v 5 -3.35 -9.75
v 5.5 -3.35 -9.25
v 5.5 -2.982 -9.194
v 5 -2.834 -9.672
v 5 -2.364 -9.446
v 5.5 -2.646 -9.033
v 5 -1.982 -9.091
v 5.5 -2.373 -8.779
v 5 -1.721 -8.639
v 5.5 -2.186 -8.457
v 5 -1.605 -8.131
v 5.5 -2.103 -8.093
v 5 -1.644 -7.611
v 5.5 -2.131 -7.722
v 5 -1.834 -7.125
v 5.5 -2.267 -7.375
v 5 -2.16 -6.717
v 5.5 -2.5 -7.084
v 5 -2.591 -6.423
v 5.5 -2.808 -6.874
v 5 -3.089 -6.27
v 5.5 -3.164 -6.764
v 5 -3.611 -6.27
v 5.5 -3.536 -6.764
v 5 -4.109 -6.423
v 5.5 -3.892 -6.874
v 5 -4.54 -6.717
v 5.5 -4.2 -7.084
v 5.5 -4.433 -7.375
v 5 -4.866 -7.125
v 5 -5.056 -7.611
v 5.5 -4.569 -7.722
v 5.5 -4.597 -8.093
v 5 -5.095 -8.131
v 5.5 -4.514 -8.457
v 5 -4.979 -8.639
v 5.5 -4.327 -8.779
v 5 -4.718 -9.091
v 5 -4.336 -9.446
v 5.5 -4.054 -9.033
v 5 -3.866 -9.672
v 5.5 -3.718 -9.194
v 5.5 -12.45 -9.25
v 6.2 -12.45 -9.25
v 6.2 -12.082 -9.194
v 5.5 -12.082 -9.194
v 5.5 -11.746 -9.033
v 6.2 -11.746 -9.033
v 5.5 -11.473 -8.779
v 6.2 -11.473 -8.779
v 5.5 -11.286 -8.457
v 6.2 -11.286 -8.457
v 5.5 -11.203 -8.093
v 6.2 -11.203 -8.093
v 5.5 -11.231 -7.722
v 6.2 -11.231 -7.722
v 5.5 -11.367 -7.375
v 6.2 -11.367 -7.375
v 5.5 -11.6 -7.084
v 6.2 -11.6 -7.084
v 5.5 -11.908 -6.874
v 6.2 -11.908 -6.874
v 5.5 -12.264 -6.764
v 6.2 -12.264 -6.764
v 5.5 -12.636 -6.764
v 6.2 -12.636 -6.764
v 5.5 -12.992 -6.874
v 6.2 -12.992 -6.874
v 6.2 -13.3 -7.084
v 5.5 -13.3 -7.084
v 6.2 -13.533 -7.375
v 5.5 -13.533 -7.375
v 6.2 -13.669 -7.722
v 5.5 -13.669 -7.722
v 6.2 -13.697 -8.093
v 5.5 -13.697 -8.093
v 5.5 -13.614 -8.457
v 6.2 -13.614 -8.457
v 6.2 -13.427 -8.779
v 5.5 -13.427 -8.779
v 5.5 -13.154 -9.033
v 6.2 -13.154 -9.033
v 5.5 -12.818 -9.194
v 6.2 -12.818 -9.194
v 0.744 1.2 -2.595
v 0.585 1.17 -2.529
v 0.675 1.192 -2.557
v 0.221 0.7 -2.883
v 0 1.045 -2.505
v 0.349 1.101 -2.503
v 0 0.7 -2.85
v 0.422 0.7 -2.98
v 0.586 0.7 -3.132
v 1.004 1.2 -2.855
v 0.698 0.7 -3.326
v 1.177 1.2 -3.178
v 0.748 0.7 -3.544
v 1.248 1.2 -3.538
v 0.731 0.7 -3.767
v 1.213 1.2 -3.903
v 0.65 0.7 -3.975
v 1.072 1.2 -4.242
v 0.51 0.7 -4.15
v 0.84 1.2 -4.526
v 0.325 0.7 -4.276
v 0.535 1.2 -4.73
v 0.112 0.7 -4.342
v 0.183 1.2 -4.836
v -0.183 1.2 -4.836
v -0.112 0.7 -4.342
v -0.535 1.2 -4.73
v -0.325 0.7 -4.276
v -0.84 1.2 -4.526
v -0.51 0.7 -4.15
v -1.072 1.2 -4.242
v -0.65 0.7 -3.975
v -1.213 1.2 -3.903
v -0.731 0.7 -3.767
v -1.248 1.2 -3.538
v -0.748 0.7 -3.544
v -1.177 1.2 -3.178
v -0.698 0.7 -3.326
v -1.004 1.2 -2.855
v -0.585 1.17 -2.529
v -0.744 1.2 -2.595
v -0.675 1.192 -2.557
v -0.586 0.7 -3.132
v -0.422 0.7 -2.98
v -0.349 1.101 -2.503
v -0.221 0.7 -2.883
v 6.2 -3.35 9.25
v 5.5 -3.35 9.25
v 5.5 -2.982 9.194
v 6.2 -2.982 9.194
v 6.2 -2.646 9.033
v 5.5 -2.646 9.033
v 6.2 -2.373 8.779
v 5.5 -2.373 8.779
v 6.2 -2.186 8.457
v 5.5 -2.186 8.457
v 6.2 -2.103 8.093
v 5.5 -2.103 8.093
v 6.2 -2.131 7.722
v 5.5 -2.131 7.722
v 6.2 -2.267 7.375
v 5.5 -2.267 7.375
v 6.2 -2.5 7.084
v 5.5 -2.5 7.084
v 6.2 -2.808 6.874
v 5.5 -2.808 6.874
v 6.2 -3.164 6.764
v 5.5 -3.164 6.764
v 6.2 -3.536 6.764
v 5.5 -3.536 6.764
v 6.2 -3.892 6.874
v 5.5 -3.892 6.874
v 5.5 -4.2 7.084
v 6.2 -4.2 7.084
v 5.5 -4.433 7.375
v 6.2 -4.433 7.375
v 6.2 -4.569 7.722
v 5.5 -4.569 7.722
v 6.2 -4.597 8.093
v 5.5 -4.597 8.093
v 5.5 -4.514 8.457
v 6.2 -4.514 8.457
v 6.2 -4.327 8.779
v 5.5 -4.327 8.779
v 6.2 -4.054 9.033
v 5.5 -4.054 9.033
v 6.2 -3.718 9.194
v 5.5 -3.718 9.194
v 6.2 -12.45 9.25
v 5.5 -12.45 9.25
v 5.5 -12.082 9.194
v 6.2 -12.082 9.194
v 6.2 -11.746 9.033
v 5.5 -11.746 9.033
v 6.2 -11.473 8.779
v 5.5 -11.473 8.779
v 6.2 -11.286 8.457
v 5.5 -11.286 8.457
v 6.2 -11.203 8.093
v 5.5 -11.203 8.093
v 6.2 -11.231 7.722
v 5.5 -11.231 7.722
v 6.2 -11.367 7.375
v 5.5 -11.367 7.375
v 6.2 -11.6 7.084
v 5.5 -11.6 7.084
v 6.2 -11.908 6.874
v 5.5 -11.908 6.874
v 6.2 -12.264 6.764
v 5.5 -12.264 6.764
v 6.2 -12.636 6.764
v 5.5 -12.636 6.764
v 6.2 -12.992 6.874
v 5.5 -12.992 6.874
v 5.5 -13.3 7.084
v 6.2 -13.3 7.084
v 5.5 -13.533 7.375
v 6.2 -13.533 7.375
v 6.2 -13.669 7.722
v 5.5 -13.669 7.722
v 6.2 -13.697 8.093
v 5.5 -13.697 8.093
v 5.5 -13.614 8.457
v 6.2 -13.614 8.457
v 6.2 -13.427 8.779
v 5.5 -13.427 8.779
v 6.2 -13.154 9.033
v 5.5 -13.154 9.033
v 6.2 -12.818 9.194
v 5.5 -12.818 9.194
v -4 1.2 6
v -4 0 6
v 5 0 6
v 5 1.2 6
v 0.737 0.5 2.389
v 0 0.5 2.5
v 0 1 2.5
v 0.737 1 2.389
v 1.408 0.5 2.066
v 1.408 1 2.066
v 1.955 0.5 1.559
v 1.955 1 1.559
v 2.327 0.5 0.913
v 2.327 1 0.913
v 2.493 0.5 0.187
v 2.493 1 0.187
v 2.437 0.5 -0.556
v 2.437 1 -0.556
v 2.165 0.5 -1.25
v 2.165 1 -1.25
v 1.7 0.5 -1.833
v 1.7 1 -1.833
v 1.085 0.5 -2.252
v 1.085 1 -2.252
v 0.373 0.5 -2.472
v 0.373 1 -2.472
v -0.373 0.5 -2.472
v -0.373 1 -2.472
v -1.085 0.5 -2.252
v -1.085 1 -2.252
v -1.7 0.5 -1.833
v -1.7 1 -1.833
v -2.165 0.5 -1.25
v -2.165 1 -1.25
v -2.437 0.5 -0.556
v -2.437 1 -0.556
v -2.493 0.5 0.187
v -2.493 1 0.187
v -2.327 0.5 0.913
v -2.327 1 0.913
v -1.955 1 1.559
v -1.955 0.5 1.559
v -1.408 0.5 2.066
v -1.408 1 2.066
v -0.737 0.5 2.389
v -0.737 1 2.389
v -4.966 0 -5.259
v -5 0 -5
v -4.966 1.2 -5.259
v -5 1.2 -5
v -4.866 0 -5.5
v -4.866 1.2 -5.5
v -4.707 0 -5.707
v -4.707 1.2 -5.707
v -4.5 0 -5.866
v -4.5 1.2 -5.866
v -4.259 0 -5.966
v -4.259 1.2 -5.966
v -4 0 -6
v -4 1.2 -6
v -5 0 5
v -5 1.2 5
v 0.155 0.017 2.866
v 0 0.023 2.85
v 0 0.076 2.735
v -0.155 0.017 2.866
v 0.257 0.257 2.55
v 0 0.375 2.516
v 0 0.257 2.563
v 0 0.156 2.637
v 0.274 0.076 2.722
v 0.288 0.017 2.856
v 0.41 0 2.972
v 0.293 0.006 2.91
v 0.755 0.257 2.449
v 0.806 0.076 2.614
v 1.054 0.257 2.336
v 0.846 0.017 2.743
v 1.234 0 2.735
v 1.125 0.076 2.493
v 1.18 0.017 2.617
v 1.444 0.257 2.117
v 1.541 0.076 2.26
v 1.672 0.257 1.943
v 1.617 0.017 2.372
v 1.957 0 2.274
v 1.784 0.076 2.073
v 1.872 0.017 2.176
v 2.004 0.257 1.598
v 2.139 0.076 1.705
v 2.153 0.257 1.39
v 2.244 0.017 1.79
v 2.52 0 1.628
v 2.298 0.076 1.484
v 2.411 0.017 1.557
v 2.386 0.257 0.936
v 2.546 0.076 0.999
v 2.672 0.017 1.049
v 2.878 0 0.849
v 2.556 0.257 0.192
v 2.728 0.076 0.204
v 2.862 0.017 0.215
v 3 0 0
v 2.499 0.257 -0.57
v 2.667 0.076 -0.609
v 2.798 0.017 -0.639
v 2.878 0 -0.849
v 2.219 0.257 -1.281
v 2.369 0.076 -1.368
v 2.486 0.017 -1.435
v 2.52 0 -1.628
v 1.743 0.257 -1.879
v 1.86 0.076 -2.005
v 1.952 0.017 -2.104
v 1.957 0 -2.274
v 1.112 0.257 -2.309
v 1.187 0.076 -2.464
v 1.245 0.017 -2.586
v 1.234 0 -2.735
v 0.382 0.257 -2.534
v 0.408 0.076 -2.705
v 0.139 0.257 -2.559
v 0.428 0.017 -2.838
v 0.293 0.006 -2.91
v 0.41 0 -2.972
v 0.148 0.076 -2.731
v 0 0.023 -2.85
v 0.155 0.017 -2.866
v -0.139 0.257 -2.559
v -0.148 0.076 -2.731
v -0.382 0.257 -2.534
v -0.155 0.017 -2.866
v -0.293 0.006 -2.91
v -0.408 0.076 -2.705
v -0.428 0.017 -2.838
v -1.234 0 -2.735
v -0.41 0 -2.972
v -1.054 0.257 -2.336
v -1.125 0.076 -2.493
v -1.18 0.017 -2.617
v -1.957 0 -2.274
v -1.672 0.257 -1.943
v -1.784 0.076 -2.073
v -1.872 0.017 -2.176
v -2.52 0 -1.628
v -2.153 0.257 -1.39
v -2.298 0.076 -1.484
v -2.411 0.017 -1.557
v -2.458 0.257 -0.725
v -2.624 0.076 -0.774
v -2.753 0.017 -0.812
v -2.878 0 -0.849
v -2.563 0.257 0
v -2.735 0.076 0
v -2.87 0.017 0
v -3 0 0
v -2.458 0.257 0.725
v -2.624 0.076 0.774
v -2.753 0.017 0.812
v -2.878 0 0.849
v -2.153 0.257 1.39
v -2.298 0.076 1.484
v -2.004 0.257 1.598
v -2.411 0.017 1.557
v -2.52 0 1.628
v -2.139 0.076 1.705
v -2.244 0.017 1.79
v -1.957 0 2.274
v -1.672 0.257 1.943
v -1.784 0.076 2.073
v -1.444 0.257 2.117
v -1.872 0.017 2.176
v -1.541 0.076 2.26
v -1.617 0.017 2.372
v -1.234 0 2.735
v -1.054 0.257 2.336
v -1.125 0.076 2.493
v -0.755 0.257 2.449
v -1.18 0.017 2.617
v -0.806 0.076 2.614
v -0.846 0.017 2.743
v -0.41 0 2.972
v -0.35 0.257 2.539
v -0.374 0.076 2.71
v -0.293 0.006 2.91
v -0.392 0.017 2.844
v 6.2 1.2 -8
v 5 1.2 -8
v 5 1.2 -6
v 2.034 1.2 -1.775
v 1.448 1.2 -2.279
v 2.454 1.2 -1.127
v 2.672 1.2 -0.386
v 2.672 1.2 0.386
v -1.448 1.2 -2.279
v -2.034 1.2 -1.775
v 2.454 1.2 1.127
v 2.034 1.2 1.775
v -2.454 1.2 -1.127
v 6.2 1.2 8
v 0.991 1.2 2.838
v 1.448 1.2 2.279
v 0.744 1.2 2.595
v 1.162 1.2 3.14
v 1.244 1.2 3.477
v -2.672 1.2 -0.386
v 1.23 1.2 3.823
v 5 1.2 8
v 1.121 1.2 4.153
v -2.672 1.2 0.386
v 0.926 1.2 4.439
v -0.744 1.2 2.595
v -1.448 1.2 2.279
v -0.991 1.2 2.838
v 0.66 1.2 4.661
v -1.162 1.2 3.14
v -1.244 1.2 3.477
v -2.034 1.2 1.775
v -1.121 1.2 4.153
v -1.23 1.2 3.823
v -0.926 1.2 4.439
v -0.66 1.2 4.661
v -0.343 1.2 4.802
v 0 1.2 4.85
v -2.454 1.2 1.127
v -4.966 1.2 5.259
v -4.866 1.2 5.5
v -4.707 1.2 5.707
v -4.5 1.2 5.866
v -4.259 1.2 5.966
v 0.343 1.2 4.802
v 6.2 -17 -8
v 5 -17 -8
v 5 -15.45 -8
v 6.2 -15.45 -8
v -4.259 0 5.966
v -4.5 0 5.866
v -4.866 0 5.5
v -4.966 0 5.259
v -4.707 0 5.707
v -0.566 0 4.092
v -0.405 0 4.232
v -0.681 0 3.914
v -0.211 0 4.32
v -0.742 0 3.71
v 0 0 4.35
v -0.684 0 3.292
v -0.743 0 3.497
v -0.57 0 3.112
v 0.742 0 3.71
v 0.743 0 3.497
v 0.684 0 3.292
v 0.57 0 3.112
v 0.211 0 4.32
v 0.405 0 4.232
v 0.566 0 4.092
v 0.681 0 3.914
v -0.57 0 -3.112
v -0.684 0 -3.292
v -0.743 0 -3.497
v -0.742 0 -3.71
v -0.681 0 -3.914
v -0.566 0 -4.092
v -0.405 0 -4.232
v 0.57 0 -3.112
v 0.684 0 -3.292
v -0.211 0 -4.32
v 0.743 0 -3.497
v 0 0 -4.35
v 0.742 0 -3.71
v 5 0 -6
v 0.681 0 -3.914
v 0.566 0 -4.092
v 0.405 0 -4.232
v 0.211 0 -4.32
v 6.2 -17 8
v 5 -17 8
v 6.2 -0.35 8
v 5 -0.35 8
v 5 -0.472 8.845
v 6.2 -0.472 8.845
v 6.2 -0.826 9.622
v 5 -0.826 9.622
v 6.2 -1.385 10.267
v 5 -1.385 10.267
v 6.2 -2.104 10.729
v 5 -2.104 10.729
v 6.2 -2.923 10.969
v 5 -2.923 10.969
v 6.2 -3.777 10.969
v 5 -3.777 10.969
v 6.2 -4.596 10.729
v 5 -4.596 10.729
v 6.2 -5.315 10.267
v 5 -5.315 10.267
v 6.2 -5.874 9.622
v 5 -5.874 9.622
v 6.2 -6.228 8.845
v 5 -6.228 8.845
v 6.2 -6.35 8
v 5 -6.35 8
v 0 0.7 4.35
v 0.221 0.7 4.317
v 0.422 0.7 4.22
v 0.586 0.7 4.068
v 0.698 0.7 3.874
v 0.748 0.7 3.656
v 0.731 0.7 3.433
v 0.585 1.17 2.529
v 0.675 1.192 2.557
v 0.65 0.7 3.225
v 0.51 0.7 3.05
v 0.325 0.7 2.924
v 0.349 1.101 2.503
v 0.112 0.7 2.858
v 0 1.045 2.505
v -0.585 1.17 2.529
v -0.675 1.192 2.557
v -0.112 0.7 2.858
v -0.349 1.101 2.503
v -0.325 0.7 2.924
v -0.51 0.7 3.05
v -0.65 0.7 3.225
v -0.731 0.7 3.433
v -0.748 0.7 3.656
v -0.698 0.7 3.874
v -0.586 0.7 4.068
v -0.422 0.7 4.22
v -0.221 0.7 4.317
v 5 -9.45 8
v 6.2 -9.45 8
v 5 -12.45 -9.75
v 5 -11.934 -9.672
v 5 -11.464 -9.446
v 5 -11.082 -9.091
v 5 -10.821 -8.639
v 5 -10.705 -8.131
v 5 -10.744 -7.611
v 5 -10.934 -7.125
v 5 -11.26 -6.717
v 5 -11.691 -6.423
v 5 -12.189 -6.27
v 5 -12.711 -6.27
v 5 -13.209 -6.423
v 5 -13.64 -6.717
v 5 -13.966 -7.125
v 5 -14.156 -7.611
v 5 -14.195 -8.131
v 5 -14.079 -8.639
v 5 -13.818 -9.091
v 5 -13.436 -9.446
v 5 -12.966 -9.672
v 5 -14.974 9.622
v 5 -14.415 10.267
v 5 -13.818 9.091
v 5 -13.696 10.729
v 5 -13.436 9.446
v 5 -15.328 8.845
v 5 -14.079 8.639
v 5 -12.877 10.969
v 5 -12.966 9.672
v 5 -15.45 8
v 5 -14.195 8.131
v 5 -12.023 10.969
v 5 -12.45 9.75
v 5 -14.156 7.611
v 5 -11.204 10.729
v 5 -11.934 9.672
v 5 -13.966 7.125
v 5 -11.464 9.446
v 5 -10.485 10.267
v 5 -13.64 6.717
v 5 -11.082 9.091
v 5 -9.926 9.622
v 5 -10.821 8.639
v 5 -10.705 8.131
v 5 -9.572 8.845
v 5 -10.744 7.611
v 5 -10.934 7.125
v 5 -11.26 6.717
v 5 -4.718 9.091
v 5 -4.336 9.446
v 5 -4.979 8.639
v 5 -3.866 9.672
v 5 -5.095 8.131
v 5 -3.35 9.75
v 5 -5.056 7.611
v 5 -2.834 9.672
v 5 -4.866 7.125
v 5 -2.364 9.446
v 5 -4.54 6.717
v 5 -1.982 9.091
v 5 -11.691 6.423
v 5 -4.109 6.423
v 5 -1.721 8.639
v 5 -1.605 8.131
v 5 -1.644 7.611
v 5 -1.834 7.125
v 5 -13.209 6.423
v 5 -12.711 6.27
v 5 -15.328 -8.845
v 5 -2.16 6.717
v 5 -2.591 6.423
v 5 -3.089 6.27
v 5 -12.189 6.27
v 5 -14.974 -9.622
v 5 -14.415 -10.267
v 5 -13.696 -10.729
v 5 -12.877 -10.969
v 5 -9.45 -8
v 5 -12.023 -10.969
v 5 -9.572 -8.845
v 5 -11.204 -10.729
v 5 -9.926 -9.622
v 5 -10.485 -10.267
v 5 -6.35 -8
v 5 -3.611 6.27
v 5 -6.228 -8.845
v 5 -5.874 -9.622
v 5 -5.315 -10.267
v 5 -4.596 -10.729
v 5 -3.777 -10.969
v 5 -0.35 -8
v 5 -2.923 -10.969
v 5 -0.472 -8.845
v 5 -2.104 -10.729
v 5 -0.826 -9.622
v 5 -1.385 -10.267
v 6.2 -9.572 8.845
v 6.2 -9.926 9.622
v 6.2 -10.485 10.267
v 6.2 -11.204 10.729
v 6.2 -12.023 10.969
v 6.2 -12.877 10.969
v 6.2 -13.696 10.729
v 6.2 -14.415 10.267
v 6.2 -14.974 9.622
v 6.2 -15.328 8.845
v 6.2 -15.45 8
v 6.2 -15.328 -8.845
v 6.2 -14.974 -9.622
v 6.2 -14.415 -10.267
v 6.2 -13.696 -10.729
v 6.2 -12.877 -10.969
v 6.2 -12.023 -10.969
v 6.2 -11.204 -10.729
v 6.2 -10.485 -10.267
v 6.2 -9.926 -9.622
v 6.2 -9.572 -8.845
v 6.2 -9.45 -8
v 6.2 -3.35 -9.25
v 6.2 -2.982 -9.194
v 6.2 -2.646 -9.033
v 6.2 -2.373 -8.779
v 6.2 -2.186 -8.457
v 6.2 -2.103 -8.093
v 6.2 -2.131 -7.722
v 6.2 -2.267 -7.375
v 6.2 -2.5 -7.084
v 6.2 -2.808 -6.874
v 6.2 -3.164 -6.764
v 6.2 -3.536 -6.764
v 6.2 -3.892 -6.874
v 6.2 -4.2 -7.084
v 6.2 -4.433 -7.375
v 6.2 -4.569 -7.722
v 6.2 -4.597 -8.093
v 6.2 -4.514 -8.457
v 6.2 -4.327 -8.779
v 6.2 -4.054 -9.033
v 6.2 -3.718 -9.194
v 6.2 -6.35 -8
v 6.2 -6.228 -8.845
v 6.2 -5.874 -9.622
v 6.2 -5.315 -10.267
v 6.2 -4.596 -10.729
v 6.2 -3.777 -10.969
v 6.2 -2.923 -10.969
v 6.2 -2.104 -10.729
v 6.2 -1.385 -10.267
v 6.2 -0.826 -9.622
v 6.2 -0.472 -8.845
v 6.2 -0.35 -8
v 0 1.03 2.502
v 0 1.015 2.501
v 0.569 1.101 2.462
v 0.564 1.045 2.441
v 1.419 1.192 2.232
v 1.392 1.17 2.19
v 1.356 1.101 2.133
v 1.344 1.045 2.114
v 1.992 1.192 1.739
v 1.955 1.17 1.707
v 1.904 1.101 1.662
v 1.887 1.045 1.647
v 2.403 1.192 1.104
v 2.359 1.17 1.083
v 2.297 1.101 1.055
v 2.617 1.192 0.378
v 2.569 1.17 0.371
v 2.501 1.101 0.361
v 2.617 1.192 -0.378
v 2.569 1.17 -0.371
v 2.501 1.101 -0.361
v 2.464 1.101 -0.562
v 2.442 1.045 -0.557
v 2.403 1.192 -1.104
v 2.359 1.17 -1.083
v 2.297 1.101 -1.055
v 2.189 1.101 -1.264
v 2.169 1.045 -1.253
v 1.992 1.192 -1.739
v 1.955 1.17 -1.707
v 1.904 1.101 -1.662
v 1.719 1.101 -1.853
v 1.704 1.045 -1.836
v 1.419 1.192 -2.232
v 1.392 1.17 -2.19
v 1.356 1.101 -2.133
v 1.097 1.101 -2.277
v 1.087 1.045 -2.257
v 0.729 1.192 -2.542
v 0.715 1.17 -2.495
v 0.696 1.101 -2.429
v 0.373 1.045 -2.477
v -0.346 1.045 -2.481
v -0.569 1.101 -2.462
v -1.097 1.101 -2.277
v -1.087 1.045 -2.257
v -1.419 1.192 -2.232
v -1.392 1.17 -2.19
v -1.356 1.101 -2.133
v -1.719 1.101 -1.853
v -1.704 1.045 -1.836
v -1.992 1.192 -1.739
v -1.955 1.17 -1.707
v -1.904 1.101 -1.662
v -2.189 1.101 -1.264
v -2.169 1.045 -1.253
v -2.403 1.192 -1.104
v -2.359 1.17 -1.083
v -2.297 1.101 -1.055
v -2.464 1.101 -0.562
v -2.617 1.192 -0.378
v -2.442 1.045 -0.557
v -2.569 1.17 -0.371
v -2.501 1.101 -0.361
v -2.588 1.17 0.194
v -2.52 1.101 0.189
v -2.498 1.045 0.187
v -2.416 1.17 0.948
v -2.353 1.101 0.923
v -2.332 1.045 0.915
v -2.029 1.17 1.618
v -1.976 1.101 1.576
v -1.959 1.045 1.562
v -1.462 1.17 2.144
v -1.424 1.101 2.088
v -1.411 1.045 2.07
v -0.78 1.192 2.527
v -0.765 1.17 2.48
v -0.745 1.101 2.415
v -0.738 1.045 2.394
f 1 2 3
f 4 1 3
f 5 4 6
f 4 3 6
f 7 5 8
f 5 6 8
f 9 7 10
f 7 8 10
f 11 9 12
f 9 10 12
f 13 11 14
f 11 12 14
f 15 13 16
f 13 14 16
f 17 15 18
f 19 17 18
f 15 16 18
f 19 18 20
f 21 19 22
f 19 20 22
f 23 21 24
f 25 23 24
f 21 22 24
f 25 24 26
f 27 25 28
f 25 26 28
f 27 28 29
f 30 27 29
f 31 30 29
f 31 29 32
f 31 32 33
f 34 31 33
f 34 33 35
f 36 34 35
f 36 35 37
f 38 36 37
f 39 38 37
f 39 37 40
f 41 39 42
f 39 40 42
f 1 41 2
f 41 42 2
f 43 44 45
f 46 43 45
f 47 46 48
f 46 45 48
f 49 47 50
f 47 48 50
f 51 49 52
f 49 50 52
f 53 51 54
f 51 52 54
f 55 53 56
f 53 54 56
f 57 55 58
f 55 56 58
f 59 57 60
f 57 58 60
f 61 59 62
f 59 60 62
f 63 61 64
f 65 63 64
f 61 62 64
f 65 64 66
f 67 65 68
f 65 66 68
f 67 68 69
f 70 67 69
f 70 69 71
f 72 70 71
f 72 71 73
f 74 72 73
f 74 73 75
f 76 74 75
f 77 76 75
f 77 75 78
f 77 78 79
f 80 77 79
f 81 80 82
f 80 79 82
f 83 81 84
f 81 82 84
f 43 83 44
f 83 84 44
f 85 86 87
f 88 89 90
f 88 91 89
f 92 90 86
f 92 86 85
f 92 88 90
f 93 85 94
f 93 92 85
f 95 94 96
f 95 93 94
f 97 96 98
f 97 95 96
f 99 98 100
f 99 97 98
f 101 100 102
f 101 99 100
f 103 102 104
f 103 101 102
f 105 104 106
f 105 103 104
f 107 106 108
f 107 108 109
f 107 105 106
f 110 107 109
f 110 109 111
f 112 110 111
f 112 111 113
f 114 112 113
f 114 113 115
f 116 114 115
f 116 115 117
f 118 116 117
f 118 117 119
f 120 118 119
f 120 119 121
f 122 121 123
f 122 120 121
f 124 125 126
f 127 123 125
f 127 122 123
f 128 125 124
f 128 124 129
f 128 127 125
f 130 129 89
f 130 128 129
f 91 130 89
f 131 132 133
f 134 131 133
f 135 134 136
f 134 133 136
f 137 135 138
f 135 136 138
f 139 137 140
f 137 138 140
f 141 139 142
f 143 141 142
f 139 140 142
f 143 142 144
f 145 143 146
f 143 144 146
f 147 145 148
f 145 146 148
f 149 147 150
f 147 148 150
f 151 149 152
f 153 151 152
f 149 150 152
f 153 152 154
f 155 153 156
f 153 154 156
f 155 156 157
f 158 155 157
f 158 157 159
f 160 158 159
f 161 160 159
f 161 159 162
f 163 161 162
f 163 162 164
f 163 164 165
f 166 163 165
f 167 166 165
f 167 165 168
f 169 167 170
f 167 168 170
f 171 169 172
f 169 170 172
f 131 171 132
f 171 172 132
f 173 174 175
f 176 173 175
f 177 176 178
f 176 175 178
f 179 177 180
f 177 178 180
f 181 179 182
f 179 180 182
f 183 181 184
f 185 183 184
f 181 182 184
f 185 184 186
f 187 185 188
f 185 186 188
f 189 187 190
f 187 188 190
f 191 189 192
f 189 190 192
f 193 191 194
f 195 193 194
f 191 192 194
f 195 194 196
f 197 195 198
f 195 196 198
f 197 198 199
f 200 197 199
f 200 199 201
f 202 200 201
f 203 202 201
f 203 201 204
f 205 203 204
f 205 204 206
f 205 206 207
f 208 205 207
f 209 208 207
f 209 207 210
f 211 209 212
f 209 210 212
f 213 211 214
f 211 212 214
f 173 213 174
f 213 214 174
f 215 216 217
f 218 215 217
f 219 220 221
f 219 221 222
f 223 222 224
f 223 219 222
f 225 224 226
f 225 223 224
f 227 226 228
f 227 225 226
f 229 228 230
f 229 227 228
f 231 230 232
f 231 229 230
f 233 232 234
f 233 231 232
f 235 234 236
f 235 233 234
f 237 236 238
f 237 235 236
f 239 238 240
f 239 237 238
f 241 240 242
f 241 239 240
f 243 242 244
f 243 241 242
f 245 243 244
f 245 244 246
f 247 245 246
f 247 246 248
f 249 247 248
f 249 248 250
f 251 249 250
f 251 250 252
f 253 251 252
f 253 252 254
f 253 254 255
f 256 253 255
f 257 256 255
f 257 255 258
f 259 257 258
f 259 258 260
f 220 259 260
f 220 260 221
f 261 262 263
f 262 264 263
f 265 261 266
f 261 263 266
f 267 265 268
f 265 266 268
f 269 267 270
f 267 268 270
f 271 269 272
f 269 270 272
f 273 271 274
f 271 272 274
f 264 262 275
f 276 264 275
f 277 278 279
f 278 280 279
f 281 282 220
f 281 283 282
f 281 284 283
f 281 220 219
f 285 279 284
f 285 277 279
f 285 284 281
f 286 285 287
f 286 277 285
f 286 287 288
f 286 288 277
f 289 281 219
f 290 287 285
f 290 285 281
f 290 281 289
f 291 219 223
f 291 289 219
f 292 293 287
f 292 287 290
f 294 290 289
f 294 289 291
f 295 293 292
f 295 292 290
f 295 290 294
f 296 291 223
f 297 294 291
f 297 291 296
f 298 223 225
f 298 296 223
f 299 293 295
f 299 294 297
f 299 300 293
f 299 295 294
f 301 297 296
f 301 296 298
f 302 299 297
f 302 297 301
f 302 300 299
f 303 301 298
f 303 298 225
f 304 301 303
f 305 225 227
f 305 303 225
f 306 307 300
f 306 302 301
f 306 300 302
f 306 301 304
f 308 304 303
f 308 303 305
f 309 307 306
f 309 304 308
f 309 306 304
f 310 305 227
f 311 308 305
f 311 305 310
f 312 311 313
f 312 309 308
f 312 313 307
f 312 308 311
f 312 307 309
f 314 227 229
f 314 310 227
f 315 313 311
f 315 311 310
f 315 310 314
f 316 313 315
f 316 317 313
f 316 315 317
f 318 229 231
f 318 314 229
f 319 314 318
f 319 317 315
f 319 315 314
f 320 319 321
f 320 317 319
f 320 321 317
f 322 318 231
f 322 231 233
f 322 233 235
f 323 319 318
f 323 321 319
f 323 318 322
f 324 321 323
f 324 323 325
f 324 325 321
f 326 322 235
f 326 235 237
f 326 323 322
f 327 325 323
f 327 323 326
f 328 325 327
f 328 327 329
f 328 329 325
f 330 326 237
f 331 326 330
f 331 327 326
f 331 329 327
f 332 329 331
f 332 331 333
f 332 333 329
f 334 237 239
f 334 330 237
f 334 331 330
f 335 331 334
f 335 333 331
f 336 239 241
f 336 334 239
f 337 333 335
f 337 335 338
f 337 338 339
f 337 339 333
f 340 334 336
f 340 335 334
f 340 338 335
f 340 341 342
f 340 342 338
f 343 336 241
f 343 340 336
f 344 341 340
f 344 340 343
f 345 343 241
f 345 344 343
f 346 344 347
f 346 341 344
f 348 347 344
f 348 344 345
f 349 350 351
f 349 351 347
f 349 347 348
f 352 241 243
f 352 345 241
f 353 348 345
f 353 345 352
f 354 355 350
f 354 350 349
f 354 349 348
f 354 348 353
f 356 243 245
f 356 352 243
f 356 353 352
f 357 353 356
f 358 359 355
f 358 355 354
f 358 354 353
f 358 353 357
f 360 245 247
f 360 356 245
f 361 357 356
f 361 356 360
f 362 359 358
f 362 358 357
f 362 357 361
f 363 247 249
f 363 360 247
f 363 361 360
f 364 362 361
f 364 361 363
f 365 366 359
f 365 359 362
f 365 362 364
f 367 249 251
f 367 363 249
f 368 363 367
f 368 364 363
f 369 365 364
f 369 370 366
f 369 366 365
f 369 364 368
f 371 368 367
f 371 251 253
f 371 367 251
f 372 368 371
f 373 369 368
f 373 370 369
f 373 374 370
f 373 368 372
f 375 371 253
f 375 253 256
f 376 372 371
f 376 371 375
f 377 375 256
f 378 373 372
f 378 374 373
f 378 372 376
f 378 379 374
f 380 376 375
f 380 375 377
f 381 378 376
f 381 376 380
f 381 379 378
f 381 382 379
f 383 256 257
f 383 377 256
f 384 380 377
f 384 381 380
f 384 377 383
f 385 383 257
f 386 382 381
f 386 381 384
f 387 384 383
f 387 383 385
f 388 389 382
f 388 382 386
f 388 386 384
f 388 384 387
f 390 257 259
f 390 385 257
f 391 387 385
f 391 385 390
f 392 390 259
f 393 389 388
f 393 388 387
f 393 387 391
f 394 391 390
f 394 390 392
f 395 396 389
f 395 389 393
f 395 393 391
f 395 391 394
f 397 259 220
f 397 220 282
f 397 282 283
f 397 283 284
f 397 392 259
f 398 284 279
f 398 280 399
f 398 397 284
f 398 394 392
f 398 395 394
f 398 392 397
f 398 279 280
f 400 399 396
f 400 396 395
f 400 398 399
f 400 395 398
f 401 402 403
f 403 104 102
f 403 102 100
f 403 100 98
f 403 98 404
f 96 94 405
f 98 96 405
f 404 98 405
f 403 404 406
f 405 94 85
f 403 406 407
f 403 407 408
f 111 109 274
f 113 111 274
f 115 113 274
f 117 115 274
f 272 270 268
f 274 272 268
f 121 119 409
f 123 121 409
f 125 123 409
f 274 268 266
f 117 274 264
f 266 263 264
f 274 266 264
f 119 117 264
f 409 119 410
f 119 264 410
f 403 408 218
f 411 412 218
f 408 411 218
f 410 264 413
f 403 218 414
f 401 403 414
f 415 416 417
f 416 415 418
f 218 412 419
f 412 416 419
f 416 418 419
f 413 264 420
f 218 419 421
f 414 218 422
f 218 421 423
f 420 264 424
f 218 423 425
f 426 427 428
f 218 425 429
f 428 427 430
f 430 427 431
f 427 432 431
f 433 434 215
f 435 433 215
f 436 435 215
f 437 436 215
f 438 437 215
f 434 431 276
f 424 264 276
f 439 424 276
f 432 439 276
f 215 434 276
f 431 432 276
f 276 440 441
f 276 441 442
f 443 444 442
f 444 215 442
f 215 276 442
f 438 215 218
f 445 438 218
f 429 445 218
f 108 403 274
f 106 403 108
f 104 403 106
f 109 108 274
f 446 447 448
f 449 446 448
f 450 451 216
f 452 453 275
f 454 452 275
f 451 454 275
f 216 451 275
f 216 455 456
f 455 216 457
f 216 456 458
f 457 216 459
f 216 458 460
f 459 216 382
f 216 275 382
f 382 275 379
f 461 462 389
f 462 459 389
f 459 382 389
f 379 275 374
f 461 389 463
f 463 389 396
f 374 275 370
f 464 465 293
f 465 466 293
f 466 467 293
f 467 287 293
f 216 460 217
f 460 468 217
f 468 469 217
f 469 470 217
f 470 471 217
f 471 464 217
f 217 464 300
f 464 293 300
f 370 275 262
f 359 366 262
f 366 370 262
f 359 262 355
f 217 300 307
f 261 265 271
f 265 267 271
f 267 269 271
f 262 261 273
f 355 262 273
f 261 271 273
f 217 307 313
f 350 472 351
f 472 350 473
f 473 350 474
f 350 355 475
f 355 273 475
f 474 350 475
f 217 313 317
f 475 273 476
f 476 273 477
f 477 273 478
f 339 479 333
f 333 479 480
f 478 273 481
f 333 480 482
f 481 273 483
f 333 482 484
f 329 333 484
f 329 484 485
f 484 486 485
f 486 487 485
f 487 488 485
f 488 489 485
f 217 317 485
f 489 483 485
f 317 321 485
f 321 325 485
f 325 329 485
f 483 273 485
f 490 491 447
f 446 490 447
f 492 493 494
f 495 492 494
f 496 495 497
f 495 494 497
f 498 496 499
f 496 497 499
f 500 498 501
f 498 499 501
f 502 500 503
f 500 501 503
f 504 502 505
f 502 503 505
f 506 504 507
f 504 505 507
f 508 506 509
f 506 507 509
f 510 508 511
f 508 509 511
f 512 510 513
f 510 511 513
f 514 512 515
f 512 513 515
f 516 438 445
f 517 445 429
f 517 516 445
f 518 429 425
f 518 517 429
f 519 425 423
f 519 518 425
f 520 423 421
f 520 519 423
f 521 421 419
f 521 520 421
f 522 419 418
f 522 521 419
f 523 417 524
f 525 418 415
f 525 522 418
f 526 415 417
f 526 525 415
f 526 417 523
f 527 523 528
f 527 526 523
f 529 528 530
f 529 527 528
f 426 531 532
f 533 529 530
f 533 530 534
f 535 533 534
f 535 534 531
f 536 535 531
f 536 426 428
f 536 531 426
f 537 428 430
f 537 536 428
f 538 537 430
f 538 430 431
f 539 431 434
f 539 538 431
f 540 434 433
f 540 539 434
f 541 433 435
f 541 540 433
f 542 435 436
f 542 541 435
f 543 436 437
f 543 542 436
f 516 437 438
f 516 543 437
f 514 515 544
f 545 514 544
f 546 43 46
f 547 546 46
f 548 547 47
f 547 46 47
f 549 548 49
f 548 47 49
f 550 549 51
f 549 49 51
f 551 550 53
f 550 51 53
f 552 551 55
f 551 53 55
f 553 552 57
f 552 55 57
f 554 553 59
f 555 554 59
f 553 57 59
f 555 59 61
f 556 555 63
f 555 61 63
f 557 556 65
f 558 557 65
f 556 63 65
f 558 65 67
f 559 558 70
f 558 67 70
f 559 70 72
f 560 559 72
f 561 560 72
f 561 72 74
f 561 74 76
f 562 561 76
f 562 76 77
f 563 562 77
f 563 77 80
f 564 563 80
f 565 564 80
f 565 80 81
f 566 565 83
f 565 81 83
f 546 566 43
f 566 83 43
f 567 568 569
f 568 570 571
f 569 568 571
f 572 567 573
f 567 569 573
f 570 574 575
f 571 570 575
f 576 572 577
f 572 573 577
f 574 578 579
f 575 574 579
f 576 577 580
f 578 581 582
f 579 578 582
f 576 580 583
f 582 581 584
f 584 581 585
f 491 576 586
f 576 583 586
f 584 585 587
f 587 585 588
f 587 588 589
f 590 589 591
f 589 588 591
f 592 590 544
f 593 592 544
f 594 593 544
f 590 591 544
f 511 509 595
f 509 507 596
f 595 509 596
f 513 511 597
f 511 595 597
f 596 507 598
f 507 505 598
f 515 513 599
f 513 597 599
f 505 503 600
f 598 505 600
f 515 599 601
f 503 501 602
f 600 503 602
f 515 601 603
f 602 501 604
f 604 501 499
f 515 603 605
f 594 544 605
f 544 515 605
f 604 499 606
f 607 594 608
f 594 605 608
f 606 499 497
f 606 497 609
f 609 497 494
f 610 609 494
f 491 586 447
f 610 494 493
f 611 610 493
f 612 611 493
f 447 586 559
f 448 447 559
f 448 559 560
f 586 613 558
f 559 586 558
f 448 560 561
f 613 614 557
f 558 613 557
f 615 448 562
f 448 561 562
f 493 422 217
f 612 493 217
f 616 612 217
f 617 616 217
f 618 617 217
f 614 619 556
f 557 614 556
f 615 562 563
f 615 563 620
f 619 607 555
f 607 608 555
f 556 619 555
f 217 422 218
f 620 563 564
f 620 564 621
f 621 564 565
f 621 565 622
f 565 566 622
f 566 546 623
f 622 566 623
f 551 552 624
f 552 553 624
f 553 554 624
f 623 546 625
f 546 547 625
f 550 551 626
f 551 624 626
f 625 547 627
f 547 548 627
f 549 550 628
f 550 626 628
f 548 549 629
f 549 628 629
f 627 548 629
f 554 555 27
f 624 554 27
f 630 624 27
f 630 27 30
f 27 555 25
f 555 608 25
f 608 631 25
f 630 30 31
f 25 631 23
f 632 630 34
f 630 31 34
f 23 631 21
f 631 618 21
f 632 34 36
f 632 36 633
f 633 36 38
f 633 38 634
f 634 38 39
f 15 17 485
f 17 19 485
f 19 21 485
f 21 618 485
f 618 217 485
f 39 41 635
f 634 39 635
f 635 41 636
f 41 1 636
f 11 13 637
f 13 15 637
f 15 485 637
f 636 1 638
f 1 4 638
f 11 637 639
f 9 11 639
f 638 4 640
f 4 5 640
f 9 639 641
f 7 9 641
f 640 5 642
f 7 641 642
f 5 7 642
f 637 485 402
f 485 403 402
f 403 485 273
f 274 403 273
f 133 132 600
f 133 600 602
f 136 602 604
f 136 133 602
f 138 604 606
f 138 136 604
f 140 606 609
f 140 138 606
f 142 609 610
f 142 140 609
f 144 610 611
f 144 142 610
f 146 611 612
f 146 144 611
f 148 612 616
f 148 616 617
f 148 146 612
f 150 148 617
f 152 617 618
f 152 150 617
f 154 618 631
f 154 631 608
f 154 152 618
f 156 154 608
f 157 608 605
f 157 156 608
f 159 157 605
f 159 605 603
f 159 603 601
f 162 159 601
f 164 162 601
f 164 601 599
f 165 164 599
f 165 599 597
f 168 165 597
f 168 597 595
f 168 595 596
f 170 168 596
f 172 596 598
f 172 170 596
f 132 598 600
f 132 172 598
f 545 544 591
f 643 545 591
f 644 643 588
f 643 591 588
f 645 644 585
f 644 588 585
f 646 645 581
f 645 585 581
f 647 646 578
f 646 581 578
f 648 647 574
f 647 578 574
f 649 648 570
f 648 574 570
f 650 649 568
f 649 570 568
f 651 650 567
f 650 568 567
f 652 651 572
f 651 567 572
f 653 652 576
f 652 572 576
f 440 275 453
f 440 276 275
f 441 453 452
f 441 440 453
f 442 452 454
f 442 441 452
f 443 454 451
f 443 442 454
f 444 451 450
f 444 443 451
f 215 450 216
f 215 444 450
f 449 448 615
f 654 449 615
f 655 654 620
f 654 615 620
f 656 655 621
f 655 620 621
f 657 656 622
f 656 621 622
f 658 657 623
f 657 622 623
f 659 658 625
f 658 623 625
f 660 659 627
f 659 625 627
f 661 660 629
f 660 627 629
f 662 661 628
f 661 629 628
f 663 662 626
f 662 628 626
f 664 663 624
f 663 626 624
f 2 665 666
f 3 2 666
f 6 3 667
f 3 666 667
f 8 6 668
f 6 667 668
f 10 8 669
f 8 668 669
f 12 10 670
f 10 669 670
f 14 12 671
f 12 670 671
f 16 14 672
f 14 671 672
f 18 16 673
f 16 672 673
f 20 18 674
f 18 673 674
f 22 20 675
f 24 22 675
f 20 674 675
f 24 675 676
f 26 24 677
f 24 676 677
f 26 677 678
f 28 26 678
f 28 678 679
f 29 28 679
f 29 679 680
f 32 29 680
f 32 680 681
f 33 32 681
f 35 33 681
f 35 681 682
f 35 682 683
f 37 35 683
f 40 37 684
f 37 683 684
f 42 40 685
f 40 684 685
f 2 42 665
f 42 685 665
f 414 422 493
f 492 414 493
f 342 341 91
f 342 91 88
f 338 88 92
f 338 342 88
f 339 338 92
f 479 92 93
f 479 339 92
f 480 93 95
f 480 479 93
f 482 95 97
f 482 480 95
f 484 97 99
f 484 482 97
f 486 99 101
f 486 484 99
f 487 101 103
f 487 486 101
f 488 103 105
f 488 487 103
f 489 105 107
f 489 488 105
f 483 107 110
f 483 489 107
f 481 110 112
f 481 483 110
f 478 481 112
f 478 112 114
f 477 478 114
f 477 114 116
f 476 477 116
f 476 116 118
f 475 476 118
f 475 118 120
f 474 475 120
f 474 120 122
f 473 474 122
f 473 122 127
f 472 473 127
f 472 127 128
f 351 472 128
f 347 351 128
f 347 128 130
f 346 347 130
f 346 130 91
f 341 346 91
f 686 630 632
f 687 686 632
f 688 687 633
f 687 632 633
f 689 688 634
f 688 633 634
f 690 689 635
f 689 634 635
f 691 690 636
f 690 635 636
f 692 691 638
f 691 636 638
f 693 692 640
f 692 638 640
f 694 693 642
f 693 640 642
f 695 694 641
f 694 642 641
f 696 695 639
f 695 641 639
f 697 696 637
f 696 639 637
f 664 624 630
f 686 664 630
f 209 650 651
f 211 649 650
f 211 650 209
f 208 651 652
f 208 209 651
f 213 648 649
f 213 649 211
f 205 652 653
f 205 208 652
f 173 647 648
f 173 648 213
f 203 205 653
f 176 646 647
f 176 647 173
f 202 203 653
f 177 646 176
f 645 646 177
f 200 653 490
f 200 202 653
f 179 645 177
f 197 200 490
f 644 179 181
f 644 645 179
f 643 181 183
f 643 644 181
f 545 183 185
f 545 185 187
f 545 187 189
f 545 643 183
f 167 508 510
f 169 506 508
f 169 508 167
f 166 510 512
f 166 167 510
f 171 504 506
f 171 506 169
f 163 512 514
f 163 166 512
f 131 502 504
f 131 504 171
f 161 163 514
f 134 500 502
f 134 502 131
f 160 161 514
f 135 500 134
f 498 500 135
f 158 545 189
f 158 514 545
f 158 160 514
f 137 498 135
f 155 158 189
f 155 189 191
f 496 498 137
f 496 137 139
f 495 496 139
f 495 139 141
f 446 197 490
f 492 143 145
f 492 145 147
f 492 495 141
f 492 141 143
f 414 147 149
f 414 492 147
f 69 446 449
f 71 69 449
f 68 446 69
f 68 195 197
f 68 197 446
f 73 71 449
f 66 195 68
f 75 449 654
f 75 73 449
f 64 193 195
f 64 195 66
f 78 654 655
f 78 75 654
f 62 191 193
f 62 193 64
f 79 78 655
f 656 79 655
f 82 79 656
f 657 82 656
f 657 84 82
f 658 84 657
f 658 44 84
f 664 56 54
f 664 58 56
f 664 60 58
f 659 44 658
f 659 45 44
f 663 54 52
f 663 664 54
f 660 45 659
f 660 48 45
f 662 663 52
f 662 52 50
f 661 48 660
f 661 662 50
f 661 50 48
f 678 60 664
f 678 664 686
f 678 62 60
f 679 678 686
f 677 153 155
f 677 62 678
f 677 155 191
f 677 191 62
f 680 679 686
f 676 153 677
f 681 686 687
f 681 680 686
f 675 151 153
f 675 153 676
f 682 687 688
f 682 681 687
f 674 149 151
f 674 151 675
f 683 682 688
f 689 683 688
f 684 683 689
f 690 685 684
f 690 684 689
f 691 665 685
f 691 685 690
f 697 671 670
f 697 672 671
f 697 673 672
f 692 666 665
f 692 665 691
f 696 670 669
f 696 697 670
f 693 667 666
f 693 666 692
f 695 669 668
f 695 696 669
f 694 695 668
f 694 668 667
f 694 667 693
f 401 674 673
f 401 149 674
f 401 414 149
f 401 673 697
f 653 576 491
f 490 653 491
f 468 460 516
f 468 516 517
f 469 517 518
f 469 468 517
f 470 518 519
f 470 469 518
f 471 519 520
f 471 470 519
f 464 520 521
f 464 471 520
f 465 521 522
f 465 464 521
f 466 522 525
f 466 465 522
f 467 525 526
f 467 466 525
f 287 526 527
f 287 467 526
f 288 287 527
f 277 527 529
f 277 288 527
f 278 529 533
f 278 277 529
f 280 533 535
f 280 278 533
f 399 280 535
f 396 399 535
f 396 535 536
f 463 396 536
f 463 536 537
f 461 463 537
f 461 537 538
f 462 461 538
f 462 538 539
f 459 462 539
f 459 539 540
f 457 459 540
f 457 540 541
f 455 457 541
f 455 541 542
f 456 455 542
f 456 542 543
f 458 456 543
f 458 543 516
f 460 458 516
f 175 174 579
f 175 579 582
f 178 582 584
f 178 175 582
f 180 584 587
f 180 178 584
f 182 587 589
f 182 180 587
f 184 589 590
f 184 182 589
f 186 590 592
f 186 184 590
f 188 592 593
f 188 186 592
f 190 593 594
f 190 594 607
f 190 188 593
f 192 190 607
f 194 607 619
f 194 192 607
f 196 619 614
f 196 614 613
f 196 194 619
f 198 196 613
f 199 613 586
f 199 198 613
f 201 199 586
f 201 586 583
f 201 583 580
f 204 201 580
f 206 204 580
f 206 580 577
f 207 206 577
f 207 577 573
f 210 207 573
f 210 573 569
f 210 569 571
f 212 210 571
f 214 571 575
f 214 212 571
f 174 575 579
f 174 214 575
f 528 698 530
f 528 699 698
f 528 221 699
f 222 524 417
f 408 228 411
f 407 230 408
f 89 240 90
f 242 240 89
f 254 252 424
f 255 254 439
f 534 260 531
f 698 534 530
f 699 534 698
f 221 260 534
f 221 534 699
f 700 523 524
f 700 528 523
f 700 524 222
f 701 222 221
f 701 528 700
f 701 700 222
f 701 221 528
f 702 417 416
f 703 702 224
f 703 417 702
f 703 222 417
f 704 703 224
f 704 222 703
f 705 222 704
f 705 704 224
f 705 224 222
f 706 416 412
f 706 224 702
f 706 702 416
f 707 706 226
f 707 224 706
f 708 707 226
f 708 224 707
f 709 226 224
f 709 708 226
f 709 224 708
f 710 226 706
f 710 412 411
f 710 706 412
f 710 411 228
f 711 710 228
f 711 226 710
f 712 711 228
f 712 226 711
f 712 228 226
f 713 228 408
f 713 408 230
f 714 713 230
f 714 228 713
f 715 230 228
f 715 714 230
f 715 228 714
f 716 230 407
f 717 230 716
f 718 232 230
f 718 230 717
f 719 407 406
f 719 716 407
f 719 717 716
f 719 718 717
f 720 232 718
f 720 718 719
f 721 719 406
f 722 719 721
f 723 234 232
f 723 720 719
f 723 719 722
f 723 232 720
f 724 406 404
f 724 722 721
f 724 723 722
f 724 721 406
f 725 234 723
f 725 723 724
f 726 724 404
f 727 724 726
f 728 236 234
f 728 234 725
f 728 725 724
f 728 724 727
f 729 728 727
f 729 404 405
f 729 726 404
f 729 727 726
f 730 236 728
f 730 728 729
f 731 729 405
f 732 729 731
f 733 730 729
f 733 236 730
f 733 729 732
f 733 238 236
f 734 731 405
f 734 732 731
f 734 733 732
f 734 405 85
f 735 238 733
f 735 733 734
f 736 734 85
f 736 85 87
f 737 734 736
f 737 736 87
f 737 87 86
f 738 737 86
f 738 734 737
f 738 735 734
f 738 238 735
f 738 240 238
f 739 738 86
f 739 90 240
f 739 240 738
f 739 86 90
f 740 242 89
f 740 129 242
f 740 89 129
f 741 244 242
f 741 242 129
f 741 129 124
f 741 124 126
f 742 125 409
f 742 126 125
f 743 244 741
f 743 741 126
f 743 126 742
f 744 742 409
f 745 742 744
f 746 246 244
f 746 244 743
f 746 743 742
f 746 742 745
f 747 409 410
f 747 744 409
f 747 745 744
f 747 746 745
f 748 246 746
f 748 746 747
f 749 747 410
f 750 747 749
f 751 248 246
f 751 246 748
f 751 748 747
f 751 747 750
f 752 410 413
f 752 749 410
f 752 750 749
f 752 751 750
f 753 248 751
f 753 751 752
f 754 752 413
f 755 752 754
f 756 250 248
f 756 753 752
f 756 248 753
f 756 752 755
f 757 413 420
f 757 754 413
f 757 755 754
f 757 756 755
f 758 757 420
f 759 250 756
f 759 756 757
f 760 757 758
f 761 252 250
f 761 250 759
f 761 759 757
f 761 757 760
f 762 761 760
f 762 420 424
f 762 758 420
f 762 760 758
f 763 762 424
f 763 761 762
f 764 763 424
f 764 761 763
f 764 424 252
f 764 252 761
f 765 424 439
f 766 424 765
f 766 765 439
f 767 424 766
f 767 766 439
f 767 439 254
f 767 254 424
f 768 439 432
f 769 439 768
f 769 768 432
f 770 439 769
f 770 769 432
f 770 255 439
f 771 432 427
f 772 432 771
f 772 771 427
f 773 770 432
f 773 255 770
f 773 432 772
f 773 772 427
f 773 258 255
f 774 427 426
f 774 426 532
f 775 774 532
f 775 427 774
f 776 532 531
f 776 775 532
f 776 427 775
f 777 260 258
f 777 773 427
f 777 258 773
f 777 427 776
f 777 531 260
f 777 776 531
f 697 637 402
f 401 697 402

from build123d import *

# Parameters (mm, degrees)
SKETCH1_R           = 0.75
SKETCH1_R_2         = 2.5
BOSS_EXTRUDE3_DEPTH = 1.2
FILLET10_R          = 1
FILLET11_R          = 1
BOSS_EXTRUDE5_DEPTH = 1.2
SKETCH6_R           = 1.25
CUT_EXTRUDE3_DEPTH  = 1.2
SKETCH7_R           = 1.25
CUT_EXTRUDE4_DEPTH  = 1.2
CHAMFER5_SIZE       = 0.5
CHAMFER6_SIZE       = 0.5
FILLET13_R          = 0.5
FILLET14_R          = 0.2
CHAMFER7_SIZE       = 0.5
CHAMFER8_SIZE       = 0.5


with BuildPart() as part:
    # Sketch1 → Boss-Extrude3 (new body)
    with BuildSketch(Plane(origin=(0, 0, 0), x_dir=(1, 0, 0), z_dir=(0, 1, 0))):
        Polygon((5, 6), (0, 6), (-5, 6), (-5, -6), (5, -6), align=None)
        with Locations(Location((0, -3.6, 0), (0, 0, 270))):
            Circle(SKETCH1_R, mode=Mode.SUBTRACT)
        with Locations(Location((0, 0, 0), (0, 0, 270))):
            Circle(SKETCH1_R_2, mode=Mode.SUBTRACT)
        with Locations(Location((0, 3.6, 0), (0, 0, 270))):
            Circle(SKETCH1_R, mode=Mode.SUBTRACT)
    extrude(amount=BOSS_EXTRUDE3_DEPTH)

    # Fillet10
    fillet10_edges = [part.edges().sort_by_distance(p)[0] for p in [
        (-5, 0.6, 6),
    ]]
    fillet(fillet10_edges, radius=FILLET10_R)

    # Fillet11
    fillet11_edges = [part.edges().sort_by_distance(p)[0] for p in [
        (-5, 0.6, -6),
    ]]
    fillet(fillet11_edges, radius=FILLET11_R)

    # Sketch5 → Boss-Extrude5 (add)
    with BuildSketch(Plane(origin=(5, 0, 0), x_dir=(0, 0, -1), z_dir=(1, 0, 0))):
        with BuildLine():
            Line((6, 1.2), (-6, 1.2))
            Line((-6, 1.2), (-8, 1.2))
            Line((-8, 1.2), (-8, -0.35))
            ThreePointArc((-8, -0.35), (-11, -3.35), (-8, -6.35))
            Line((-8, -6.35), (-8, -9.45))
            ThreePointArc((-8, -9.45), (-11, -12.45), (-8, -15.45))
            Line((-8, -15.45), (-8, -17))
            Line((-8, -17), (8, -17))
            Line((8, -17), (8, -15.45))
            ThreePointArc((8, -15.45), (11, -12.45), (8, -9.45))
            Line((8, -9.45), (8, -6.35))
            ThreePointArc((8, -6.35), (11, -3.35), (8, -0.35))
            Line((8, -0.35), (8, 1.2))
            Line((8, 1.2), (6, 1.2))
        make_face()
    extrude(amount=BOSS_EXTRUDE5_DEPTH)

    # Sketch6 → Cut-Extrude3 (cut)
    with BuildSketch(Plane(origin=(6.2, 0, 0), x_dir=(0, 0, -1), z_dir=(1, 0, 0))):
        with Locations((8, -3.35)):
            Circle(SKETCH6_R)
        with Locations((8, -12.45)):
            Circle(SKETCH6_R)
    extrude(amount=-CUT_EXTRUDE3_DEPTH, mode=Mode.SUBTRACT)

    # Sketch7 → Cut-Extrude4 (cut)
    with BuildSketch(Plane.ZY.offset(-5)):
        with Locations((8, -12.45)):
            Circle(SKETCH7_R)
        with Locations((8, -3.35)):
            Circle(SKETCH7_R)
    extrude(amount=-CUT_EXTRUDE4_DEPTH, mode=Mode.SUBTRACT)

    # Chamfer5
    chamfer5_edges = [part.edges().sort_by_distance(p)[0] for p in [
        (5, -3.35, 6.75),
    ]]
    chamfer(chamfer5_edges, length=CHAMFER5_SIZE)

    # Chamfer6
    chamfer6_edges = [part.edges().sort_by_distance(p)[0] for p in [
        (5, -3.35, -6.75),
        (5, -12.45, -6.75),
        (5, -12.45, 6.75),
    ]]
    chamfer(chamfer6_edges, length=CHAMFER6_SIZE)

    # Fillet13
    # the kernel refuses this fillet: 0.5 mm, written as the material it takes off along each edge
    with BuildSketch(Plane(origin=(0, 0, 0), x_dir=(0, 0, 1), z_dir=(-1, 0, 0))) as fillet13_piece_1:
        with BuildLine():
            CenterArc((2.5 + FILLET13_R, FILLET13_R), FILLET13_R, 180, 90)
            Line((2.5, FILLET13_R), (2.5, 0))
            Line((2.5, 0), (2.5 + FILLET13_R, 0))
        make_face()
    revolve(axis=Axis((0, 0, 0), (0, 1, 0)), mode=Mode.SUBTRACT)

    # Fillet14
    fillet14_edges = [part.edges().sort_by_distance(p)[0] for p in [
        (0, 1.2, -2.5),
    ]]
    fillet(fillet14_edges, radius=FILLET14_R)

    # Chamfer7
    # the kernel refuses this chamfer: 0.5 mm, written as the material it takes off along each edge
    with BuildSketch(Plane(origin=(0, 1.2, 3.6), x_dir=(0, 0, 1), z_dir=(-1, 0, 0))) as chamfer7_piece_1:
        Polygon((0.75 + CHAMFER7_SIZE, 0), (0.75, -CHAMFER7_SIZE), (0.75, 0), align=None)
    revolve(axis=Axis((0, 1.2, 3.6), (0, 1, 0)), mode=Mode.SUBTRACT)

    # Chamfer8
    # the kernel refuses this chamfer: 0.5 mm, written as the material it takes off along each edge
    with BuildSketch(Plane(origin=(0, 1.2, -3.6), x_dir=(0, 0, 1), z_dir=(-1, 0, 0))) as chamfer8_piece_1:
        Polygon((0.75 + CHAMFER8_SIZE, 0), (0.75, -CHAMFER8_SIZE), (0.75, 0), align=None)
    revolve(axis=Axis((0, 1.2, -3.6), (0, 1, 0)), mode=Mode.SUBTRACT)


solid = part.part
